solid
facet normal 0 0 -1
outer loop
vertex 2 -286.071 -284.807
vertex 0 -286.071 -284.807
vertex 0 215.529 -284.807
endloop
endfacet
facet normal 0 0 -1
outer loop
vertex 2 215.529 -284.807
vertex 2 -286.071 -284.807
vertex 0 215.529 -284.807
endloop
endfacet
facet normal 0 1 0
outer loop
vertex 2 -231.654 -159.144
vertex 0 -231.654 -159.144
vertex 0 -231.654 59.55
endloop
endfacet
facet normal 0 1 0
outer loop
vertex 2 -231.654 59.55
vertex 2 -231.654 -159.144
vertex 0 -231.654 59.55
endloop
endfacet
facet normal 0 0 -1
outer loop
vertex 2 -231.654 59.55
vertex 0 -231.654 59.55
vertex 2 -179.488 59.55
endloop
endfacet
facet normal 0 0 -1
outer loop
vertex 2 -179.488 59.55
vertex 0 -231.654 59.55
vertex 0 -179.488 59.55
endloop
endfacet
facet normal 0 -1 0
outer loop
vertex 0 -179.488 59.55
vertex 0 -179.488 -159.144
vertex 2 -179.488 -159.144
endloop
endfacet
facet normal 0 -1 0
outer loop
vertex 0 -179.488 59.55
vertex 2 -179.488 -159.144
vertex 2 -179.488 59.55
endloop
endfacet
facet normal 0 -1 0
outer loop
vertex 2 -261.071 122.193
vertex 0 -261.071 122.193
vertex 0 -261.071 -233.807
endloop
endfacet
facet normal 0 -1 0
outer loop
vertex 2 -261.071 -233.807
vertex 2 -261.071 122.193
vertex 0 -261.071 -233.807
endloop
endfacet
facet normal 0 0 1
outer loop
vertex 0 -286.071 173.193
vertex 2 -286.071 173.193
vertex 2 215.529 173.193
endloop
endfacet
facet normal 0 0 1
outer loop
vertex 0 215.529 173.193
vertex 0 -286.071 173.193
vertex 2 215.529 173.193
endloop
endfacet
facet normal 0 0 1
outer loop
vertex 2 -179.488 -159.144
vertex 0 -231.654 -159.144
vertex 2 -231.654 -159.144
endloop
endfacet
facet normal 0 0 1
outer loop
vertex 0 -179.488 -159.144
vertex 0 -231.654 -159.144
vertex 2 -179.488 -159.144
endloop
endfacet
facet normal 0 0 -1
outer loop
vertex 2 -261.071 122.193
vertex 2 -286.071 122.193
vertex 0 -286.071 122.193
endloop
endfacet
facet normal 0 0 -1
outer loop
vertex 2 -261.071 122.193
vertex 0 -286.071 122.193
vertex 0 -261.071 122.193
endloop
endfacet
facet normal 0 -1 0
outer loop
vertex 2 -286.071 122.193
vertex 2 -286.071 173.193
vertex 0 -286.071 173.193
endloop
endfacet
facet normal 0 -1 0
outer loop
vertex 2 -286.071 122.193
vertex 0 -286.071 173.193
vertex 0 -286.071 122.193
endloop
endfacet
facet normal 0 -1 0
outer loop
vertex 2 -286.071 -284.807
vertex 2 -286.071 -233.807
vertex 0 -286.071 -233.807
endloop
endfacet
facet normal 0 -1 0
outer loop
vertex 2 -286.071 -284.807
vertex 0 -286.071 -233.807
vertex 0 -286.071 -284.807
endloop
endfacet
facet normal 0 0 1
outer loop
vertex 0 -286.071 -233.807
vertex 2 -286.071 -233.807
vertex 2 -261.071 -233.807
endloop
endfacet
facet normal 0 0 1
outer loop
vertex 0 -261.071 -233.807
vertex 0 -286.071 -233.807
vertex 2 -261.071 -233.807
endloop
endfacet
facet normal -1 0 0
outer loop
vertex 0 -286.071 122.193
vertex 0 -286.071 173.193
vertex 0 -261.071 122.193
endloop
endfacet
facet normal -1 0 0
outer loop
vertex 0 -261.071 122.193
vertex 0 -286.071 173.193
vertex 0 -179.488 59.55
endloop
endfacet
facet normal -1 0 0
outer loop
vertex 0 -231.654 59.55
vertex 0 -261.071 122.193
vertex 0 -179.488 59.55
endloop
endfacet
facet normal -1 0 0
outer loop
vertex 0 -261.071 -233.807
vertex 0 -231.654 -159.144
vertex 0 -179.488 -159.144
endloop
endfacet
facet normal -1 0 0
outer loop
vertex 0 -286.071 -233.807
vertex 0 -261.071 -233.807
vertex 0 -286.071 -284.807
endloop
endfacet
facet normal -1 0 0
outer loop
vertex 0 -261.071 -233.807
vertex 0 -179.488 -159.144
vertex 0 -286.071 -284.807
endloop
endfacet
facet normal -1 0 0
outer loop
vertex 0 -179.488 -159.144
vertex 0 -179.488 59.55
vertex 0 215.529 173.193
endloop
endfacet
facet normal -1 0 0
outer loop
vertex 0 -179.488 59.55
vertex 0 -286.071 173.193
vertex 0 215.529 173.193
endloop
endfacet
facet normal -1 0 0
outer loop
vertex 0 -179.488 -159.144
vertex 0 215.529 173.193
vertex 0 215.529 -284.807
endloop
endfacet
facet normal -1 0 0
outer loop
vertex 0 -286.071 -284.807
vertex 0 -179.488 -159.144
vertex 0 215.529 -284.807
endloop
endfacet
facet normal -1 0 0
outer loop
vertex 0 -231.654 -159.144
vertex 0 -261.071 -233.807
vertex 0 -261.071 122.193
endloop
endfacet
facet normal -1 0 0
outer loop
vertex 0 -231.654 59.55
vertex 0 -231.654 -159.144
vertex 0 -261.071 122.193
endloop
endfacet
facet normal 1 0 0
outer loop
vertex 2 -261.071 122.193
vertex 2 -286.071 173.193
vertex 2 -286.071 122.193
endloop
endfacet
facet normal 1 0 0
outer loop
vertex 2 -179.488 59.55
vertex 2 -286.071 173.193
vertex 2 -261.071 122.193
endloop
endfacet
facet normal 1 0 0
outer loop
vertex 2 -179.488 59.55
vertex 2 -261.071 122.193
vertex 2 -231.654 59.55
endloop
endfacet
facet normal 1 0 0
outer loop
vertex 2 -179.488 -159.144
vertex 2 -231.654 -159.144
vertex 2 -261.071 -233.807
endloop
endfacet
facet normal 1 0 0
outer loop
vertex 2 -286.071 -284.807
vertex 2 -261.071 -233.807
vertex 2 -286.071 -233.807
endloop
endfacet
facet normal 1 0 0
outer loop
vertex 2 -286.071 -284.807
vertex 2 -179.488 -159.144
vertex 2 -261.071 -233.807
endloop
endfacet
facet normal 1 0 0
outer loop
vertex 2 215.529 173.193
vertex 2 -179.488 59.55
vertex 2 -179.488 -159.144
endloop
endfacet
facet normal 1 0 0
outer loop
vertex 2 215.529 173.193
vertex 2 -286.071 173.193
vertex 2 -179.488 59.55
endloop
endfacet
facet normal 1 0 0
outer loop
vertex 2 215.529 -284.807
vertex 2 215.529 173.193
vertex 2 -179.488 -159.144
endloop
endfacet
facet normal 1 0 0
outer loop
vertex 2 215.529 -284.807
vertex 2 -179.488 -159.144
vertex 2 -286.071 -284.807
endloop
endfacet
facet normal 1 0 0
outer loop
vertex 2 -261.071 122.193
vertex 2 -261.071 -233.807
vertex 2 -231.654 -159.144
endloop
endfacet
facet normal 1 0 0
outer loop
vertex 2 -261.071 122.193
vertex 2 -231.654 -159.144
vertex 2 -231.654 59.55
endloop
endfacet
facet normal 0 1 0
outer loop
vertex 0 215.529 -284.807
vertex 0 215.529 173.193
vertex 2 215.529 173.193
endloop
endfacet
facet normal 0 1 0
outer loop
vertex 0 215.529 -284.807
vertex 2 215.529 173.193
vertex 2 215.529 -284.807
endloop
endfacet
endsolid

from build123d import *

# Parameters (mm, degrees)
SKETCH1_W           = 458
SKETCH1_H           = 476.6
BOSS_EXTRUDE1_DEPTH = 2
SKETCH2_W           = 51
SKETCH2_H           = 25
BOSS_EXTRUDE2_DEPTH = 2
SKETCH3_W           = 218.693705359
SKETCH3_H           = 52.165471003
CUT_EXTRUDE1_DEPTH  = 10


with BuildPart() as part:
    # Sketch1 → Boss-Extrude1 (new body)
    with BuildSketch(Plane(origin=(0, 0, 0), x_dir=(0, 0, -1), z_dir=(1, 0, 0))):
        with Locations((55.806722689, -22.770588235)):
            Rectangle(SKETCH1_W, SKETCH1_H)
    extrude(amount=BOSS_EXTRUDE1_DEPTH)

    # Sketch2 → Boss-Extrude2 (add)
    with BuildSketch(Plane(origin=(2, 0, 0), x_dir=(0, 0, -1), z_dir=(1, 0, 0))):
        with Locations((-147.693277311, -273.570588235)):
            Rectangle(SKETCH2_W, SKETCH2_H)
        with Locations((259.306722689, -273.570588235)):
            Rectangle(SKETCH2_W, SKETCH2_H)
    extrude(amount=-BOSS_EXTRUDE2_DEPTH)

    # Sketch3 → Cut-Extrude1 (cut)
    with BuildSketch(Plane.ZY):
        with Locations((-49.796656363, -205.571162235)):
            Rectangle(SKETCH3_W, SKETCH3_H)
    extrude(amount=-CUT_EXTRUDE1_DEPTH, mode=Mode.SUBTRACT)


solid = part.part
